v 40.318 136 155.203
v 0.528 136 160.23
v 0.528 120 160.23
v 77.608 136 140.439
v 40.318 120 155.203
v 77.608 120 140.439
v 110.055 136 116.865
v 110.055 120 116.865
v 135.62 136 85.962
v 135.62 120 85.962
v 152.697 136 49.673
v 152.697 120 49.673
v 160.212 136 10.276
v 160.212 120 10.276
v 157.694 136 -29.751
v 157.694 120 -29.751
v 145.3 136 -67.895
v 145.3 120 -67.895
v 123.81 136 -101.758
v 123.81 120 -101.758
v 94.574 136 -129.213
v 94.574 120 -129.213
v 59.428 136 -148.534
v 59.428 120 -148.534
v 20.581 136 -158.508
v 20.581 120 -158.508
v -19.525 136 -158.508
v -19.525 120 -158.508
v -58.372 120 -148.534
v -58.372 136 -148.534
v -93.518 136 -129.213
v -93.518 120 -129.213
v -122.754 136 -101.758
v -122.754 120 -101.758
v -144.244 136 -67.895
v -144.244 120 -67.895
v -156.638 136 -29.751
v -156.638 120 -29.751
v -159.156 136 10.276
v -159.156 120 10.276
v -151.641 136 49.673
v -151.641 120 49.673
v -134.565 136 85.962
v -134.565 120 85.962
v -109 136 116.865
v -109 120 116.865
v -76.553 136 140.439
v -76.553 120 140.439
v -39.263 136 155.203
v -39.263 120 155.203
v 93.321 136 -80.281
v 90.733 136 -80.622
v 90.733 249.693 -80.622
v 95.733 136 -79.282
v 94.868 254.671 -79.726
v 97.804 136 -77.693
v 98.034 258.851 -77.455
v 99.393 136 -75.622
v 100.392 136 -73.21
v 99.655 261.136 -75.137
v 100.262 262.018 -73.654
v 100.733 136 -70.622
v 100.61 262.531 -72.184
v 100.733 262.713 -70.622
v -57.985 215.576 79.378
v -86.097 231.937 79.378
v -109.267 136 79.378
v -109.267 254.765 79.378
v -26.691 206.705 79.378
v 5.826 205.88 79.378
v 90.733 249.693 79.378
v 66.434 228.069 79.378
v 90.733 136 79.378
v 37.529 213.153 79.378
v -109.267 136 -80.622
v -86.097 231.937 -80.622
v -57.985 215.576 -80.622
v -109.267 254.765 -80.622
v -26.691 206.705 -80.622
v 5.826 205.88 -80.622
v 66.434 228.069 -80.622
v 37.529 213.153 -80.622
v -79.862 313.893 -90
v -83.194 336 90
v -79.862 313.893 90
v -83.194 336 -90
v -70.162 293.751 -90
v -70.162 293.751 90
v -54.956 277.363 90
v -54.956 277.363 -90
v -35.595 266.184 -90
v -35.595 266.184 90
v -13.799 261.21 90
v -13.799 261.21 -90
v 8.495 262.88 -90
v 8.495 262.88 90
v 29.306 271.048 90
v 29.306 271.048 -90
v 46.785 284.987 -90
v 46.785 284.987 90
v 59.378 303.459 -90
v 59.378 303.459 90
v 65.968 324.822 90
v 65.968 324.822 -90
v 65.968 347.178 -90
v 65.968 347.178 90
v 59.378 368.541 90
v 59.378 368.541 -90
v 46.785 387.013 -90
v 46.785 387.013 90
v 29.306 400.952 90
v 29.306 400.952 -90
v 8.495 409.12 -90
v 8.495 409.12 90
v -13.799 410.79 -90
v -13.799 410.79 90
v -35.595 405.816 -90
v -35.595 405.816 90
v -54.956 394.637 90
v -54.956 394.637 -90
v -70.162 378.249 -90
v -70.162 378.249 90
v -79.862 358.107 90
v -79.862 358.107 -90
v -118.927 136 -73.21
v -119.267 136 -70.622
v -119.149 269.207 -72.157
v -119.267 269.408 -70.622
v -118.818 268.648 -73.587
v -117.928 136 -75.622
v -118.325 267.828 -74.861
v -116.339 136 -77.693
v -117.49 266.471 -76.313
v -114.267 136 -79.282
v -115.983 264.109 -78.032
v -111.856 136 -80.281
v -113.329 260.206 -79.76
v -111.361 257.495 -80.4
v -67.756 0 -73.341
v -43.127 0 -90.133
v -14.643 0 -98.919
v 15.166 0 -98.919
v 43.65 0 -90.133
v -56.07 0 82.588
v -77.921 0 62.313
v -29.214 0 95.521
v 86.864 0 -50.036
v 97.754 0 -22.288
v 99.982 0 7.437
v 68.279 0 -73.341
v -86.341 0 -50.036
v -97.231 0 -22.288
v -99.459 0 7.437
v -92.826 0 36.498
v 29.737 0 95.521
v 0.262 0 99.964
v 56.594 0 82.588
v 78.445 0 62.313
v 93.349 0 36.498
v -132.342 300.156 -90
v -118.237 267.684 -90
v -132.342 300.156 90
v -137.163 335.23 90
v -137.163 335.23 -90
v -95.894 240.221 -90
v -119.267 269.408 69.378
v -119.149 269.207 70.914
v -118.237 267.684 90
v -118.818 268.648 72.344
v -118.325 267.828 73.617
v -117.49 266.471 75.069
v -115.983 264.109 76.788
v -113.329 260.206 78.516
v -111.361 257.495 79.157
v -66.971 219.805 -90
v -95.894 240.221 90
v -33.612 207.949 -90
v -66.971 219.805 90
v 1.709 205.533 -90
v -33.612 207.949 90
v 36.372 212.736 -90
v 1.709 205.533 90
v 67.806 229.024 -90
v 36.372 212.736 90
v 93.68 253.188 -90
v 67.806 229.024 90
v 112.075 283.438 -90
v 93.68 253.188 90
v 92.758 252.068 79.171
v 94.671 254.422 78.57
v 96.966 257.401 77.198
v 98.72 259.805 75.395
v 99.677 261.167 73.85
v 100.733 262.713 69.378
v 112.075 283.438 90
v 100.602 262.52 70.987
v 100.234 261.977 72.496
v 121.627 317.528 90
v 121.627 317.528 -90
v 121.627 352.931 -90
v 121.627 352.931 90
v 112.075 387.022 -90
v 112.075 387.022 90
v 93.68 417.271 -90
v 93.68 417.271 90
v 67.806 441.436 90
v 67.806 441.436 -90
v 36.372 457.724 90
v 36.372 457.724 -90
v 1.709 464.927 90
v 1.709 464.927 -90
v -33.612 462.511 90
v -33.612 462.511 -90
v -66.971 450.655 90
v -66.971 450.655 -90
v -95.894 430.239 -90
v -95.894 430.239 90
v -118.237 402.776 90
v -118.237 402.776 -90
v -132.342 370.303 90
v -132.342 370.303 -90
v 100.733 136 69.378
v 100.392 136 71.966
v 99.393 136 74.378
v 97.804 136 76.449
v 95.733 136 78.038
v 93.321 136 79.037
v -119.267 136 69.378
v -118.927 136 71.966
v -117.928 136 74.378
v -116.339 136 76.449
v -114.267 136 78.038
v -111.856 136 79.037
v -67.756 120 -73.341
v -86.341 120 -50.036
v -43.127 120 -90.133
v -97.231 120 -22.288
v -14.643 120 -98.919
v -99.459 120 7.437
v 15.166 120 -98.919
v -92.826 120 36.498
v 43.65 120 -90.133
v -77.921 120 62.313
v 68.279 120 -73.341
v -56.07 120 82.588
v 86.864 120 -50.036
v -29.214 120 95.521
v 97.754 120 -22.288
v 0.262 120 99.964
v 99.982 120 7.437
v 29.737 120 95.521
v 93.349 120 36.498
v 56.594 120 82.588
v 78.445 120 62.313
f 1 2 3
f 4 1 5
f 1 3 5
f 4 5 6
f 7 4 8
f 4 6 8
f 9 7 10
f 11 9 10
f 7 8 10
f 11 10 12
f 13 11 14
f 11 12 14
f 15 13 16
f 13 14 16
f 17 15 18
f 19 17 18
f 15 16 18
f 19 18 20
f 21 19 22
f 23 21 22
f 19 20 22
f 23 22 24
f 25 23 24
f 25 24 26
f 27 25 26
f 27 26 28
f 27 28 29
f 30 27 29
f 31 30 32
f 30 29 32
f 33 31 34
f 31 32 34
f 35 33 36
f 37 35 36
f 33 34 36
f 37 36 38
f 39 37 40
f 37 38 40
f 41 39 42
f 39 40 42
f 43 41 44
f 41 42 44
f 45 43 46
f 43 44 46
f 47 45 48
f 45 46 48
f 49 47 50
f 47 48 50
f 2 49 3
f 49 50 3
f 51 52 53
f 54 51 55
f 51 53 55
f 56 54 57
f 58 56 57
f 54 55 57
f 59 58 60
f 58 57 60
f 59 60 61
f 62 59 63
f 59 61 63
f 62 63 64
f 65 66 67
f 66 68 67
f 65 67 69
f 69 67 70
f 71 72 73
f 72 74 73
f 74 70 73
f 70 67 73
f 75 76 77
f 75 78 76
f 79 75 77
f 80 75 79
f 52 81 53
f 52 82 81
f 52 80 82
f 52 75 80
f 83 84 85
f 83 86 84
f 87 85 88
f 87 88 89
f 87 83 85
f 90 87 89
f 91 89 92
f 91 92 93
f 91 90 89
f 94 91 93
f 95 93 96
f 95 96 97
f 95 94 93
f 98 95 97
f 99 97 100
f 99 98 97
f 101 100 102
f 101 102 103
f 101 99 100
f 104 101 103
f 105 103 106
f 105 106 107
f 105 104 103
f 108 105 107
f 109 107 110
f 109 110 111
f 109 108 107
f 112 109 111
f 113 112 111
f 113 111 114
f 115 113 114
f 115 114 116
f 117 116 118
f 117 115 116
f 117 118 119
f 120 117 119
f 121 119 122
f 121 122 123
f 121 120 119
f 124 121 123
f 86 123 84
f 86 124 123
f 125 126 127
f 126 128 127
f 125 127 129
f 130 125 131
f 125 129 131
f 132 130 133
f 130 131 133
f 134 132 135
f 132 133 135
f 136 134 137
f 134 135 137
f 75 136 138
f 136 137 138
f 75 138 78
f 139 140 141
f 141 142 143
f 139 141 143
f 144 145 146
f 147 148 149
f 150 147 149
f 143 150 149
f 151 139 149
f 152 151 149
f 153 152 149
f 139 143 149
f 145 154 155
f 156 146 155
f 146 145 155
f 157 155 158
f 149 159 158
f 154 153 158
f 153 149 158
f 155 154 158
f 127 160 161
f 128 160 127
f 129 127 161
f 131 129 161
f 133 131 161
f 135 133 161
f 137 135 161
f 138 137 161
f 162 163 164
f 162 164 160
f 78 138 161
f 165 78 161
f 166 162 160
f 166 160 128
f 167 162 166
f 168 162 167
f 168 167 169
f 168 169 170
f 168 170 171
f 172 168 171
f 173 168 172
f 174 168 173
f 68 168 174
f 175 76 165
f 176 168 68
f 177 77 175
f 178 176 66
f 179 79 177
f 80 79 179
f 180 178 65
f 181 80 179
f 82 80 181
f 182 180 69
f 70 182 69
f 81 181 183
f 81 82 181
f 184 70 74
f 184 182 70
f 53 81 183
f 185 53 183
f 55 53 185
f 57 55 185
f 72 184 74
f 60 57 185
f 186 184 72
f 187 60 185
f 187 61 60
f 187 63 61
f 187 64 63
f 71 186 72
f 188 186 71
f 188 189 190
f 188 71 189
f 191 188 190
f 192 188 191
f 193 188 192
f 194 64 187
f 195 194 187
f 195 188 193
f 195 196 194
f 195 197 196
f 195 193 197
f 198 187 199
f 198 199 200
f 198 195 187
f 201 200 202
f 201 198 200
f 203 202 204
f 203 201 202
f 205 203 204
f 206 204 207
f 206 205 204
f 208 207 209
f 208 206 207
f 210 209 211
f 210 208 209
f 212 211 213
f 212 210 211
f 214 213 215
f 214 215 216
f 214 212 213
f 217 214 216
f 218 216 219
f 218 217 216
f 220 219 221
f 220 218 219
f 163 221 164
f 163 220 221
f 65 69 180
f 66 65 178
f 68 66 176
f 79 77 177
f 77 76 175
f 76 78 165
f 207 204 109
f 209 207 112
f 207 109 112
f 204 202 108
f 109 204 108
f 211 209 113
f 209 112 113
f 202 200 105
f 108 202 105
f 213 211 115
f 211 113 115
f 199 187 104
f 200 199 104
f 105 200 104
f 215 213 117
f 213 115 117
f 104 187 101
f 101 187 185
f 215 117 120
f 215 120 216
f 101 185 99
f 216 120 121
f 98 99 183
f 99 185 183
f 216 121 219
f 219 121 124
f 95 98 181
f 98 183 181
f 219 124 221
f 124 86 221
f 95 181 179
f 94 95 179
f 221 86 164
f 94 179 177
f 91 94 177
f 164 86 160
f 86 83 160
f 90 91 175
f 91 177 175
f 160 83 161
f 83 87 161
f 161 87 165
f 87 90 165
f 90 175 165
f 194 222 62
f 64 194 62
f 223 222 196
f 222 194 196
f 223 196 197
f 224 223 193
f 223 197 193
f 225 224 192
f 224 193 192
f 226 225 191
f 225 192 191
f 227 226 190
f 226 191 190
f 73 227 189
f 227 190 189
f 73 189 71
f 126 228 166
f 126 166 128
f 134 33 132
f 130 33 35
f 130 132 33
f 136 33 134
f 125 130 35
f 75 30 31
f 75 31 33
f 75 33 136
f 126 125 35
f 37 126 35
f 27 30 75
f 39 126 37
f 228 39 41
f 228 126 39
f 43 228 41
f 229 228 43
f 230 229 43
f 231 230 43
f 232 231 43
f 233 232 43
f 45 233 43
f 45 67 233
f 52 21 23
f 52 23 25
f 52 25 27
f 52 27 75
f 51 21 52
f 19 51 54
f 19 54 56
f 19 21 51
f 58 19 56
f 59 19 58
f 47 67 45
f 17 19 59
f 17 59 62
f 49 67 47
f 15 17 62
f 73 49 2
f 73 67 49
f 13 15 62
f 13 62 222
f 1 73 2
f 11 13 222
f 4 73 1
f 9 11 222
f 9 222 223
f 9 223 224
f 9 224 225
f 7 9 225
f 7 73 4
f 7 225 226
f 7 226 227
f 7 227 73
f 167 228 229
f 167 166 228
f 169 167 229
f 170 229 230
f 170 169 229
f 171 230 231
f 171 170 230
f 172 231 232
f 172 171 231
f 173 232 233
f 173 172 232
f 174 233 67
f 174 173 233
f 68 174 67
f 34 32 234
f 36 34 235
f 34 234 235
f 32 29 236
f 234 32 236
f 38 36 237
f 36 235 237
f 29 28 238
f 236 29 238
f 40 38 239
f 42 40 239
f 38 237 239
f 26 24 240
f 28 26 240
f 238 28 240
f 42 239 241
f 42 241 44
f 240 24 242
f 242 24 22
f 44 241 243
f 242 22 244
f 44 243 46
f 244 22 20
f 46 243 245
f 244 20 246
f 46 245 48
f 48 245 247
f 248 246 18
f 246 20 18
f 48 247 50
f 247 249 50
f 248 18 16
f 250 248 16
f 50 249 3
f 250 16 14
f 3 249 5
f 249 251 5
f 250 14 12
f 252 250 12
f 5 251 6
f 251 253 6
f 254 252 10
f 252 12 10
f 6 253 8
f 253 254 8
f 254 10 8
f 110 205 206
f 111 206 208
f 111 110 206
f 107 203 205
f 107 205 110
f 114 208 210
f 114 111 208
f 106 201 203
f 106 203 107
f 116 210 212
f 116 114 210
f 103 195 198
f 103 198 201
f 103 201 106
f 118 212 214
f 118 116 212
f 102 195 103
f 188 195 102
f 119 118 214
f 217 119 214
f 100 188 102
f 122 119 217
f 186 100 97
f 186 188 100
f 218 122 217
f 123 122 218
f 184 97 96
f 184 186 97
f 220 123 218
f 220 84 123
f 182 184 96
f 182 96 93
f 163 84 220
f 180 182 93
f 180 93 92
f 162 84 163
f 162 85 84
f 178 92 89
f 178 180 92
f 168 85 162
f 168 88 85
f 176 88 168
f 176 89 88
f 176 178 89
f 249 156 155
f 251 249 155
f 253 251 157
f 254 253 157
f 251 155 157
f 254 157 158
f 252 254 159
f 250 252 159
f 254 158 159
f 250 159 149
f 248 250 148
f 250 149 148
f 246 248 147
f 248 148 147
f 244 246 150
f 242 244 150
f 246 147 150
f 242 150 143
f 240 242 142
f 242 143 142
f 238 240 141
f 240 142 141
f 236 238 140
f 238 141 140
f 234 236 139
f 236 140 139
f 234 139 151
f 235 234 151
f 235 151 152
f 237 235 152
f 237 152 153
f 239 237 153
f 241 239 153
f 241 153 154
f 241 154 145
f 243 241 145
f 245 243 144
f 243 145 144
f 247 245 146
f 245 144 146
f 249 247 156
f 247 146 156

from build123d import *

# Parameters (mm, degrees)
SKETCH2_R                = 100
BOSS_EXTRUDE1_DEPTH      = 120
SKETCH3_R                = 160
BOSS_EXTRUDE2_DEPTH      = 16
SKETCH5_R                = 130
SKETCH5_R_2              = 75
BOSS_EXTRUDE3_DEPTH      = 90
BOSS_EXTRUDE4_REACH      = 401.794
BOSS_EXTRUDE4_END_RADIUS = 130
SKETCH6_W                = 220
SKETCH6_H                = 160
FILLET1_R                = 10


with BuildPart() as part:
    # Sketch2 → Boss-Extrude1 (new body)
    with BuildSketch(Plane(origin=(0, 0, 0), x_dir=(1, 0, 0), z_dir=(0, 1, 0))):
        with Locations(Location((0.261683243, 0.036180985, 0), (0, 0, 270))):
            Circle(SKETCH2_R)
    extrude(amount=BOSS_EXTRUDE1_DEPTH)

    # Sketch3 → Boss-Extrude2 (add)
    with BuildSketch(Plane(origin=(0, 120, 0), x_dir=(1, 0, 0), z_dir=(0, 1, 0))):
        with Locations(Location((0.527861333, -0.229997105, 0), (0, 0, 270))):
            Circle(SKETCH3_R)
    extrude(amount=BOSS_EXTRUDE2_DEPTH)



with BuildPart() as body_2:
    # Sketch5 → Boss-Extrude3 (new, symmetric)
    with BuildSketch(Plane.XY):
        with Locations(Location((-7.162571242, 335.229832199, 0), (0, 0, 180))):
            Circle(SKETCH5_R)
        with Locations(Location((-8.194202002, 336, 0), (0, 0, 180))):
            Circle(SKETCH5_R_2, mode=Mode.SUBTRACT)
    extrude(amount=BOSS_EXTRUDE3_DEPTH, both=True)


with BuildPart() as part_1:
    add(part.part)

    add(body_2.part)  # Boss-Extrude4 merges body 2
    # Boss-Extrude4: up to this cylinder (the profile starts outside it)
    boss_extrude4_end = Plane(origin=(-7.162571242, 335.229832199, -0.621773), z_dir=(0, 0, -1)) * Cylinder(BOSS_EXTRUDE4_END_RADIUS, 1064.588, mode=Mode.PRIVATE)
    # Sketch6 → Boss-Extrude4 (add, up to the surface)
    with BuildSketch(Plane(origin=(0, 136, 0), x_dir=(1, 0, 0), z_dir=(0, 1, 0)), mode=Mode.PRIVATE) as boss_extrude4_sk1:
        with Locations((-9.267492371, 0.621772782)):
            Rectangle(SKETCH6_W, SKETCH6_H)
    boss_extrude4_tool1 = extrude(boss_extrude4_sk1.sketch, amount=BOSS_EXTRUDE4_REACH, mode=Mode.PRIVATE) - boss_extrude4_end
    add(boss_extrude4_tool1.solids().sort_by_distance((-9.267492, 136, -0.621773))[0])

    # Fillet1
    fillet1_edges = [part_1.edges().sort_by_distance(p)[0] for p in [
        (-119.267492371, 202.704102304, 79.378227218),
        (-119.267492371, 202.704102304, -80.621772782),
        (100.732507629, 199.356634441, 79.378227218),
        (100.732507629, 199.356634441, -80.621772782),
    ]]
    fillet(fillet1_edges, radius=FILLET1_R)


solid = part_1.part
